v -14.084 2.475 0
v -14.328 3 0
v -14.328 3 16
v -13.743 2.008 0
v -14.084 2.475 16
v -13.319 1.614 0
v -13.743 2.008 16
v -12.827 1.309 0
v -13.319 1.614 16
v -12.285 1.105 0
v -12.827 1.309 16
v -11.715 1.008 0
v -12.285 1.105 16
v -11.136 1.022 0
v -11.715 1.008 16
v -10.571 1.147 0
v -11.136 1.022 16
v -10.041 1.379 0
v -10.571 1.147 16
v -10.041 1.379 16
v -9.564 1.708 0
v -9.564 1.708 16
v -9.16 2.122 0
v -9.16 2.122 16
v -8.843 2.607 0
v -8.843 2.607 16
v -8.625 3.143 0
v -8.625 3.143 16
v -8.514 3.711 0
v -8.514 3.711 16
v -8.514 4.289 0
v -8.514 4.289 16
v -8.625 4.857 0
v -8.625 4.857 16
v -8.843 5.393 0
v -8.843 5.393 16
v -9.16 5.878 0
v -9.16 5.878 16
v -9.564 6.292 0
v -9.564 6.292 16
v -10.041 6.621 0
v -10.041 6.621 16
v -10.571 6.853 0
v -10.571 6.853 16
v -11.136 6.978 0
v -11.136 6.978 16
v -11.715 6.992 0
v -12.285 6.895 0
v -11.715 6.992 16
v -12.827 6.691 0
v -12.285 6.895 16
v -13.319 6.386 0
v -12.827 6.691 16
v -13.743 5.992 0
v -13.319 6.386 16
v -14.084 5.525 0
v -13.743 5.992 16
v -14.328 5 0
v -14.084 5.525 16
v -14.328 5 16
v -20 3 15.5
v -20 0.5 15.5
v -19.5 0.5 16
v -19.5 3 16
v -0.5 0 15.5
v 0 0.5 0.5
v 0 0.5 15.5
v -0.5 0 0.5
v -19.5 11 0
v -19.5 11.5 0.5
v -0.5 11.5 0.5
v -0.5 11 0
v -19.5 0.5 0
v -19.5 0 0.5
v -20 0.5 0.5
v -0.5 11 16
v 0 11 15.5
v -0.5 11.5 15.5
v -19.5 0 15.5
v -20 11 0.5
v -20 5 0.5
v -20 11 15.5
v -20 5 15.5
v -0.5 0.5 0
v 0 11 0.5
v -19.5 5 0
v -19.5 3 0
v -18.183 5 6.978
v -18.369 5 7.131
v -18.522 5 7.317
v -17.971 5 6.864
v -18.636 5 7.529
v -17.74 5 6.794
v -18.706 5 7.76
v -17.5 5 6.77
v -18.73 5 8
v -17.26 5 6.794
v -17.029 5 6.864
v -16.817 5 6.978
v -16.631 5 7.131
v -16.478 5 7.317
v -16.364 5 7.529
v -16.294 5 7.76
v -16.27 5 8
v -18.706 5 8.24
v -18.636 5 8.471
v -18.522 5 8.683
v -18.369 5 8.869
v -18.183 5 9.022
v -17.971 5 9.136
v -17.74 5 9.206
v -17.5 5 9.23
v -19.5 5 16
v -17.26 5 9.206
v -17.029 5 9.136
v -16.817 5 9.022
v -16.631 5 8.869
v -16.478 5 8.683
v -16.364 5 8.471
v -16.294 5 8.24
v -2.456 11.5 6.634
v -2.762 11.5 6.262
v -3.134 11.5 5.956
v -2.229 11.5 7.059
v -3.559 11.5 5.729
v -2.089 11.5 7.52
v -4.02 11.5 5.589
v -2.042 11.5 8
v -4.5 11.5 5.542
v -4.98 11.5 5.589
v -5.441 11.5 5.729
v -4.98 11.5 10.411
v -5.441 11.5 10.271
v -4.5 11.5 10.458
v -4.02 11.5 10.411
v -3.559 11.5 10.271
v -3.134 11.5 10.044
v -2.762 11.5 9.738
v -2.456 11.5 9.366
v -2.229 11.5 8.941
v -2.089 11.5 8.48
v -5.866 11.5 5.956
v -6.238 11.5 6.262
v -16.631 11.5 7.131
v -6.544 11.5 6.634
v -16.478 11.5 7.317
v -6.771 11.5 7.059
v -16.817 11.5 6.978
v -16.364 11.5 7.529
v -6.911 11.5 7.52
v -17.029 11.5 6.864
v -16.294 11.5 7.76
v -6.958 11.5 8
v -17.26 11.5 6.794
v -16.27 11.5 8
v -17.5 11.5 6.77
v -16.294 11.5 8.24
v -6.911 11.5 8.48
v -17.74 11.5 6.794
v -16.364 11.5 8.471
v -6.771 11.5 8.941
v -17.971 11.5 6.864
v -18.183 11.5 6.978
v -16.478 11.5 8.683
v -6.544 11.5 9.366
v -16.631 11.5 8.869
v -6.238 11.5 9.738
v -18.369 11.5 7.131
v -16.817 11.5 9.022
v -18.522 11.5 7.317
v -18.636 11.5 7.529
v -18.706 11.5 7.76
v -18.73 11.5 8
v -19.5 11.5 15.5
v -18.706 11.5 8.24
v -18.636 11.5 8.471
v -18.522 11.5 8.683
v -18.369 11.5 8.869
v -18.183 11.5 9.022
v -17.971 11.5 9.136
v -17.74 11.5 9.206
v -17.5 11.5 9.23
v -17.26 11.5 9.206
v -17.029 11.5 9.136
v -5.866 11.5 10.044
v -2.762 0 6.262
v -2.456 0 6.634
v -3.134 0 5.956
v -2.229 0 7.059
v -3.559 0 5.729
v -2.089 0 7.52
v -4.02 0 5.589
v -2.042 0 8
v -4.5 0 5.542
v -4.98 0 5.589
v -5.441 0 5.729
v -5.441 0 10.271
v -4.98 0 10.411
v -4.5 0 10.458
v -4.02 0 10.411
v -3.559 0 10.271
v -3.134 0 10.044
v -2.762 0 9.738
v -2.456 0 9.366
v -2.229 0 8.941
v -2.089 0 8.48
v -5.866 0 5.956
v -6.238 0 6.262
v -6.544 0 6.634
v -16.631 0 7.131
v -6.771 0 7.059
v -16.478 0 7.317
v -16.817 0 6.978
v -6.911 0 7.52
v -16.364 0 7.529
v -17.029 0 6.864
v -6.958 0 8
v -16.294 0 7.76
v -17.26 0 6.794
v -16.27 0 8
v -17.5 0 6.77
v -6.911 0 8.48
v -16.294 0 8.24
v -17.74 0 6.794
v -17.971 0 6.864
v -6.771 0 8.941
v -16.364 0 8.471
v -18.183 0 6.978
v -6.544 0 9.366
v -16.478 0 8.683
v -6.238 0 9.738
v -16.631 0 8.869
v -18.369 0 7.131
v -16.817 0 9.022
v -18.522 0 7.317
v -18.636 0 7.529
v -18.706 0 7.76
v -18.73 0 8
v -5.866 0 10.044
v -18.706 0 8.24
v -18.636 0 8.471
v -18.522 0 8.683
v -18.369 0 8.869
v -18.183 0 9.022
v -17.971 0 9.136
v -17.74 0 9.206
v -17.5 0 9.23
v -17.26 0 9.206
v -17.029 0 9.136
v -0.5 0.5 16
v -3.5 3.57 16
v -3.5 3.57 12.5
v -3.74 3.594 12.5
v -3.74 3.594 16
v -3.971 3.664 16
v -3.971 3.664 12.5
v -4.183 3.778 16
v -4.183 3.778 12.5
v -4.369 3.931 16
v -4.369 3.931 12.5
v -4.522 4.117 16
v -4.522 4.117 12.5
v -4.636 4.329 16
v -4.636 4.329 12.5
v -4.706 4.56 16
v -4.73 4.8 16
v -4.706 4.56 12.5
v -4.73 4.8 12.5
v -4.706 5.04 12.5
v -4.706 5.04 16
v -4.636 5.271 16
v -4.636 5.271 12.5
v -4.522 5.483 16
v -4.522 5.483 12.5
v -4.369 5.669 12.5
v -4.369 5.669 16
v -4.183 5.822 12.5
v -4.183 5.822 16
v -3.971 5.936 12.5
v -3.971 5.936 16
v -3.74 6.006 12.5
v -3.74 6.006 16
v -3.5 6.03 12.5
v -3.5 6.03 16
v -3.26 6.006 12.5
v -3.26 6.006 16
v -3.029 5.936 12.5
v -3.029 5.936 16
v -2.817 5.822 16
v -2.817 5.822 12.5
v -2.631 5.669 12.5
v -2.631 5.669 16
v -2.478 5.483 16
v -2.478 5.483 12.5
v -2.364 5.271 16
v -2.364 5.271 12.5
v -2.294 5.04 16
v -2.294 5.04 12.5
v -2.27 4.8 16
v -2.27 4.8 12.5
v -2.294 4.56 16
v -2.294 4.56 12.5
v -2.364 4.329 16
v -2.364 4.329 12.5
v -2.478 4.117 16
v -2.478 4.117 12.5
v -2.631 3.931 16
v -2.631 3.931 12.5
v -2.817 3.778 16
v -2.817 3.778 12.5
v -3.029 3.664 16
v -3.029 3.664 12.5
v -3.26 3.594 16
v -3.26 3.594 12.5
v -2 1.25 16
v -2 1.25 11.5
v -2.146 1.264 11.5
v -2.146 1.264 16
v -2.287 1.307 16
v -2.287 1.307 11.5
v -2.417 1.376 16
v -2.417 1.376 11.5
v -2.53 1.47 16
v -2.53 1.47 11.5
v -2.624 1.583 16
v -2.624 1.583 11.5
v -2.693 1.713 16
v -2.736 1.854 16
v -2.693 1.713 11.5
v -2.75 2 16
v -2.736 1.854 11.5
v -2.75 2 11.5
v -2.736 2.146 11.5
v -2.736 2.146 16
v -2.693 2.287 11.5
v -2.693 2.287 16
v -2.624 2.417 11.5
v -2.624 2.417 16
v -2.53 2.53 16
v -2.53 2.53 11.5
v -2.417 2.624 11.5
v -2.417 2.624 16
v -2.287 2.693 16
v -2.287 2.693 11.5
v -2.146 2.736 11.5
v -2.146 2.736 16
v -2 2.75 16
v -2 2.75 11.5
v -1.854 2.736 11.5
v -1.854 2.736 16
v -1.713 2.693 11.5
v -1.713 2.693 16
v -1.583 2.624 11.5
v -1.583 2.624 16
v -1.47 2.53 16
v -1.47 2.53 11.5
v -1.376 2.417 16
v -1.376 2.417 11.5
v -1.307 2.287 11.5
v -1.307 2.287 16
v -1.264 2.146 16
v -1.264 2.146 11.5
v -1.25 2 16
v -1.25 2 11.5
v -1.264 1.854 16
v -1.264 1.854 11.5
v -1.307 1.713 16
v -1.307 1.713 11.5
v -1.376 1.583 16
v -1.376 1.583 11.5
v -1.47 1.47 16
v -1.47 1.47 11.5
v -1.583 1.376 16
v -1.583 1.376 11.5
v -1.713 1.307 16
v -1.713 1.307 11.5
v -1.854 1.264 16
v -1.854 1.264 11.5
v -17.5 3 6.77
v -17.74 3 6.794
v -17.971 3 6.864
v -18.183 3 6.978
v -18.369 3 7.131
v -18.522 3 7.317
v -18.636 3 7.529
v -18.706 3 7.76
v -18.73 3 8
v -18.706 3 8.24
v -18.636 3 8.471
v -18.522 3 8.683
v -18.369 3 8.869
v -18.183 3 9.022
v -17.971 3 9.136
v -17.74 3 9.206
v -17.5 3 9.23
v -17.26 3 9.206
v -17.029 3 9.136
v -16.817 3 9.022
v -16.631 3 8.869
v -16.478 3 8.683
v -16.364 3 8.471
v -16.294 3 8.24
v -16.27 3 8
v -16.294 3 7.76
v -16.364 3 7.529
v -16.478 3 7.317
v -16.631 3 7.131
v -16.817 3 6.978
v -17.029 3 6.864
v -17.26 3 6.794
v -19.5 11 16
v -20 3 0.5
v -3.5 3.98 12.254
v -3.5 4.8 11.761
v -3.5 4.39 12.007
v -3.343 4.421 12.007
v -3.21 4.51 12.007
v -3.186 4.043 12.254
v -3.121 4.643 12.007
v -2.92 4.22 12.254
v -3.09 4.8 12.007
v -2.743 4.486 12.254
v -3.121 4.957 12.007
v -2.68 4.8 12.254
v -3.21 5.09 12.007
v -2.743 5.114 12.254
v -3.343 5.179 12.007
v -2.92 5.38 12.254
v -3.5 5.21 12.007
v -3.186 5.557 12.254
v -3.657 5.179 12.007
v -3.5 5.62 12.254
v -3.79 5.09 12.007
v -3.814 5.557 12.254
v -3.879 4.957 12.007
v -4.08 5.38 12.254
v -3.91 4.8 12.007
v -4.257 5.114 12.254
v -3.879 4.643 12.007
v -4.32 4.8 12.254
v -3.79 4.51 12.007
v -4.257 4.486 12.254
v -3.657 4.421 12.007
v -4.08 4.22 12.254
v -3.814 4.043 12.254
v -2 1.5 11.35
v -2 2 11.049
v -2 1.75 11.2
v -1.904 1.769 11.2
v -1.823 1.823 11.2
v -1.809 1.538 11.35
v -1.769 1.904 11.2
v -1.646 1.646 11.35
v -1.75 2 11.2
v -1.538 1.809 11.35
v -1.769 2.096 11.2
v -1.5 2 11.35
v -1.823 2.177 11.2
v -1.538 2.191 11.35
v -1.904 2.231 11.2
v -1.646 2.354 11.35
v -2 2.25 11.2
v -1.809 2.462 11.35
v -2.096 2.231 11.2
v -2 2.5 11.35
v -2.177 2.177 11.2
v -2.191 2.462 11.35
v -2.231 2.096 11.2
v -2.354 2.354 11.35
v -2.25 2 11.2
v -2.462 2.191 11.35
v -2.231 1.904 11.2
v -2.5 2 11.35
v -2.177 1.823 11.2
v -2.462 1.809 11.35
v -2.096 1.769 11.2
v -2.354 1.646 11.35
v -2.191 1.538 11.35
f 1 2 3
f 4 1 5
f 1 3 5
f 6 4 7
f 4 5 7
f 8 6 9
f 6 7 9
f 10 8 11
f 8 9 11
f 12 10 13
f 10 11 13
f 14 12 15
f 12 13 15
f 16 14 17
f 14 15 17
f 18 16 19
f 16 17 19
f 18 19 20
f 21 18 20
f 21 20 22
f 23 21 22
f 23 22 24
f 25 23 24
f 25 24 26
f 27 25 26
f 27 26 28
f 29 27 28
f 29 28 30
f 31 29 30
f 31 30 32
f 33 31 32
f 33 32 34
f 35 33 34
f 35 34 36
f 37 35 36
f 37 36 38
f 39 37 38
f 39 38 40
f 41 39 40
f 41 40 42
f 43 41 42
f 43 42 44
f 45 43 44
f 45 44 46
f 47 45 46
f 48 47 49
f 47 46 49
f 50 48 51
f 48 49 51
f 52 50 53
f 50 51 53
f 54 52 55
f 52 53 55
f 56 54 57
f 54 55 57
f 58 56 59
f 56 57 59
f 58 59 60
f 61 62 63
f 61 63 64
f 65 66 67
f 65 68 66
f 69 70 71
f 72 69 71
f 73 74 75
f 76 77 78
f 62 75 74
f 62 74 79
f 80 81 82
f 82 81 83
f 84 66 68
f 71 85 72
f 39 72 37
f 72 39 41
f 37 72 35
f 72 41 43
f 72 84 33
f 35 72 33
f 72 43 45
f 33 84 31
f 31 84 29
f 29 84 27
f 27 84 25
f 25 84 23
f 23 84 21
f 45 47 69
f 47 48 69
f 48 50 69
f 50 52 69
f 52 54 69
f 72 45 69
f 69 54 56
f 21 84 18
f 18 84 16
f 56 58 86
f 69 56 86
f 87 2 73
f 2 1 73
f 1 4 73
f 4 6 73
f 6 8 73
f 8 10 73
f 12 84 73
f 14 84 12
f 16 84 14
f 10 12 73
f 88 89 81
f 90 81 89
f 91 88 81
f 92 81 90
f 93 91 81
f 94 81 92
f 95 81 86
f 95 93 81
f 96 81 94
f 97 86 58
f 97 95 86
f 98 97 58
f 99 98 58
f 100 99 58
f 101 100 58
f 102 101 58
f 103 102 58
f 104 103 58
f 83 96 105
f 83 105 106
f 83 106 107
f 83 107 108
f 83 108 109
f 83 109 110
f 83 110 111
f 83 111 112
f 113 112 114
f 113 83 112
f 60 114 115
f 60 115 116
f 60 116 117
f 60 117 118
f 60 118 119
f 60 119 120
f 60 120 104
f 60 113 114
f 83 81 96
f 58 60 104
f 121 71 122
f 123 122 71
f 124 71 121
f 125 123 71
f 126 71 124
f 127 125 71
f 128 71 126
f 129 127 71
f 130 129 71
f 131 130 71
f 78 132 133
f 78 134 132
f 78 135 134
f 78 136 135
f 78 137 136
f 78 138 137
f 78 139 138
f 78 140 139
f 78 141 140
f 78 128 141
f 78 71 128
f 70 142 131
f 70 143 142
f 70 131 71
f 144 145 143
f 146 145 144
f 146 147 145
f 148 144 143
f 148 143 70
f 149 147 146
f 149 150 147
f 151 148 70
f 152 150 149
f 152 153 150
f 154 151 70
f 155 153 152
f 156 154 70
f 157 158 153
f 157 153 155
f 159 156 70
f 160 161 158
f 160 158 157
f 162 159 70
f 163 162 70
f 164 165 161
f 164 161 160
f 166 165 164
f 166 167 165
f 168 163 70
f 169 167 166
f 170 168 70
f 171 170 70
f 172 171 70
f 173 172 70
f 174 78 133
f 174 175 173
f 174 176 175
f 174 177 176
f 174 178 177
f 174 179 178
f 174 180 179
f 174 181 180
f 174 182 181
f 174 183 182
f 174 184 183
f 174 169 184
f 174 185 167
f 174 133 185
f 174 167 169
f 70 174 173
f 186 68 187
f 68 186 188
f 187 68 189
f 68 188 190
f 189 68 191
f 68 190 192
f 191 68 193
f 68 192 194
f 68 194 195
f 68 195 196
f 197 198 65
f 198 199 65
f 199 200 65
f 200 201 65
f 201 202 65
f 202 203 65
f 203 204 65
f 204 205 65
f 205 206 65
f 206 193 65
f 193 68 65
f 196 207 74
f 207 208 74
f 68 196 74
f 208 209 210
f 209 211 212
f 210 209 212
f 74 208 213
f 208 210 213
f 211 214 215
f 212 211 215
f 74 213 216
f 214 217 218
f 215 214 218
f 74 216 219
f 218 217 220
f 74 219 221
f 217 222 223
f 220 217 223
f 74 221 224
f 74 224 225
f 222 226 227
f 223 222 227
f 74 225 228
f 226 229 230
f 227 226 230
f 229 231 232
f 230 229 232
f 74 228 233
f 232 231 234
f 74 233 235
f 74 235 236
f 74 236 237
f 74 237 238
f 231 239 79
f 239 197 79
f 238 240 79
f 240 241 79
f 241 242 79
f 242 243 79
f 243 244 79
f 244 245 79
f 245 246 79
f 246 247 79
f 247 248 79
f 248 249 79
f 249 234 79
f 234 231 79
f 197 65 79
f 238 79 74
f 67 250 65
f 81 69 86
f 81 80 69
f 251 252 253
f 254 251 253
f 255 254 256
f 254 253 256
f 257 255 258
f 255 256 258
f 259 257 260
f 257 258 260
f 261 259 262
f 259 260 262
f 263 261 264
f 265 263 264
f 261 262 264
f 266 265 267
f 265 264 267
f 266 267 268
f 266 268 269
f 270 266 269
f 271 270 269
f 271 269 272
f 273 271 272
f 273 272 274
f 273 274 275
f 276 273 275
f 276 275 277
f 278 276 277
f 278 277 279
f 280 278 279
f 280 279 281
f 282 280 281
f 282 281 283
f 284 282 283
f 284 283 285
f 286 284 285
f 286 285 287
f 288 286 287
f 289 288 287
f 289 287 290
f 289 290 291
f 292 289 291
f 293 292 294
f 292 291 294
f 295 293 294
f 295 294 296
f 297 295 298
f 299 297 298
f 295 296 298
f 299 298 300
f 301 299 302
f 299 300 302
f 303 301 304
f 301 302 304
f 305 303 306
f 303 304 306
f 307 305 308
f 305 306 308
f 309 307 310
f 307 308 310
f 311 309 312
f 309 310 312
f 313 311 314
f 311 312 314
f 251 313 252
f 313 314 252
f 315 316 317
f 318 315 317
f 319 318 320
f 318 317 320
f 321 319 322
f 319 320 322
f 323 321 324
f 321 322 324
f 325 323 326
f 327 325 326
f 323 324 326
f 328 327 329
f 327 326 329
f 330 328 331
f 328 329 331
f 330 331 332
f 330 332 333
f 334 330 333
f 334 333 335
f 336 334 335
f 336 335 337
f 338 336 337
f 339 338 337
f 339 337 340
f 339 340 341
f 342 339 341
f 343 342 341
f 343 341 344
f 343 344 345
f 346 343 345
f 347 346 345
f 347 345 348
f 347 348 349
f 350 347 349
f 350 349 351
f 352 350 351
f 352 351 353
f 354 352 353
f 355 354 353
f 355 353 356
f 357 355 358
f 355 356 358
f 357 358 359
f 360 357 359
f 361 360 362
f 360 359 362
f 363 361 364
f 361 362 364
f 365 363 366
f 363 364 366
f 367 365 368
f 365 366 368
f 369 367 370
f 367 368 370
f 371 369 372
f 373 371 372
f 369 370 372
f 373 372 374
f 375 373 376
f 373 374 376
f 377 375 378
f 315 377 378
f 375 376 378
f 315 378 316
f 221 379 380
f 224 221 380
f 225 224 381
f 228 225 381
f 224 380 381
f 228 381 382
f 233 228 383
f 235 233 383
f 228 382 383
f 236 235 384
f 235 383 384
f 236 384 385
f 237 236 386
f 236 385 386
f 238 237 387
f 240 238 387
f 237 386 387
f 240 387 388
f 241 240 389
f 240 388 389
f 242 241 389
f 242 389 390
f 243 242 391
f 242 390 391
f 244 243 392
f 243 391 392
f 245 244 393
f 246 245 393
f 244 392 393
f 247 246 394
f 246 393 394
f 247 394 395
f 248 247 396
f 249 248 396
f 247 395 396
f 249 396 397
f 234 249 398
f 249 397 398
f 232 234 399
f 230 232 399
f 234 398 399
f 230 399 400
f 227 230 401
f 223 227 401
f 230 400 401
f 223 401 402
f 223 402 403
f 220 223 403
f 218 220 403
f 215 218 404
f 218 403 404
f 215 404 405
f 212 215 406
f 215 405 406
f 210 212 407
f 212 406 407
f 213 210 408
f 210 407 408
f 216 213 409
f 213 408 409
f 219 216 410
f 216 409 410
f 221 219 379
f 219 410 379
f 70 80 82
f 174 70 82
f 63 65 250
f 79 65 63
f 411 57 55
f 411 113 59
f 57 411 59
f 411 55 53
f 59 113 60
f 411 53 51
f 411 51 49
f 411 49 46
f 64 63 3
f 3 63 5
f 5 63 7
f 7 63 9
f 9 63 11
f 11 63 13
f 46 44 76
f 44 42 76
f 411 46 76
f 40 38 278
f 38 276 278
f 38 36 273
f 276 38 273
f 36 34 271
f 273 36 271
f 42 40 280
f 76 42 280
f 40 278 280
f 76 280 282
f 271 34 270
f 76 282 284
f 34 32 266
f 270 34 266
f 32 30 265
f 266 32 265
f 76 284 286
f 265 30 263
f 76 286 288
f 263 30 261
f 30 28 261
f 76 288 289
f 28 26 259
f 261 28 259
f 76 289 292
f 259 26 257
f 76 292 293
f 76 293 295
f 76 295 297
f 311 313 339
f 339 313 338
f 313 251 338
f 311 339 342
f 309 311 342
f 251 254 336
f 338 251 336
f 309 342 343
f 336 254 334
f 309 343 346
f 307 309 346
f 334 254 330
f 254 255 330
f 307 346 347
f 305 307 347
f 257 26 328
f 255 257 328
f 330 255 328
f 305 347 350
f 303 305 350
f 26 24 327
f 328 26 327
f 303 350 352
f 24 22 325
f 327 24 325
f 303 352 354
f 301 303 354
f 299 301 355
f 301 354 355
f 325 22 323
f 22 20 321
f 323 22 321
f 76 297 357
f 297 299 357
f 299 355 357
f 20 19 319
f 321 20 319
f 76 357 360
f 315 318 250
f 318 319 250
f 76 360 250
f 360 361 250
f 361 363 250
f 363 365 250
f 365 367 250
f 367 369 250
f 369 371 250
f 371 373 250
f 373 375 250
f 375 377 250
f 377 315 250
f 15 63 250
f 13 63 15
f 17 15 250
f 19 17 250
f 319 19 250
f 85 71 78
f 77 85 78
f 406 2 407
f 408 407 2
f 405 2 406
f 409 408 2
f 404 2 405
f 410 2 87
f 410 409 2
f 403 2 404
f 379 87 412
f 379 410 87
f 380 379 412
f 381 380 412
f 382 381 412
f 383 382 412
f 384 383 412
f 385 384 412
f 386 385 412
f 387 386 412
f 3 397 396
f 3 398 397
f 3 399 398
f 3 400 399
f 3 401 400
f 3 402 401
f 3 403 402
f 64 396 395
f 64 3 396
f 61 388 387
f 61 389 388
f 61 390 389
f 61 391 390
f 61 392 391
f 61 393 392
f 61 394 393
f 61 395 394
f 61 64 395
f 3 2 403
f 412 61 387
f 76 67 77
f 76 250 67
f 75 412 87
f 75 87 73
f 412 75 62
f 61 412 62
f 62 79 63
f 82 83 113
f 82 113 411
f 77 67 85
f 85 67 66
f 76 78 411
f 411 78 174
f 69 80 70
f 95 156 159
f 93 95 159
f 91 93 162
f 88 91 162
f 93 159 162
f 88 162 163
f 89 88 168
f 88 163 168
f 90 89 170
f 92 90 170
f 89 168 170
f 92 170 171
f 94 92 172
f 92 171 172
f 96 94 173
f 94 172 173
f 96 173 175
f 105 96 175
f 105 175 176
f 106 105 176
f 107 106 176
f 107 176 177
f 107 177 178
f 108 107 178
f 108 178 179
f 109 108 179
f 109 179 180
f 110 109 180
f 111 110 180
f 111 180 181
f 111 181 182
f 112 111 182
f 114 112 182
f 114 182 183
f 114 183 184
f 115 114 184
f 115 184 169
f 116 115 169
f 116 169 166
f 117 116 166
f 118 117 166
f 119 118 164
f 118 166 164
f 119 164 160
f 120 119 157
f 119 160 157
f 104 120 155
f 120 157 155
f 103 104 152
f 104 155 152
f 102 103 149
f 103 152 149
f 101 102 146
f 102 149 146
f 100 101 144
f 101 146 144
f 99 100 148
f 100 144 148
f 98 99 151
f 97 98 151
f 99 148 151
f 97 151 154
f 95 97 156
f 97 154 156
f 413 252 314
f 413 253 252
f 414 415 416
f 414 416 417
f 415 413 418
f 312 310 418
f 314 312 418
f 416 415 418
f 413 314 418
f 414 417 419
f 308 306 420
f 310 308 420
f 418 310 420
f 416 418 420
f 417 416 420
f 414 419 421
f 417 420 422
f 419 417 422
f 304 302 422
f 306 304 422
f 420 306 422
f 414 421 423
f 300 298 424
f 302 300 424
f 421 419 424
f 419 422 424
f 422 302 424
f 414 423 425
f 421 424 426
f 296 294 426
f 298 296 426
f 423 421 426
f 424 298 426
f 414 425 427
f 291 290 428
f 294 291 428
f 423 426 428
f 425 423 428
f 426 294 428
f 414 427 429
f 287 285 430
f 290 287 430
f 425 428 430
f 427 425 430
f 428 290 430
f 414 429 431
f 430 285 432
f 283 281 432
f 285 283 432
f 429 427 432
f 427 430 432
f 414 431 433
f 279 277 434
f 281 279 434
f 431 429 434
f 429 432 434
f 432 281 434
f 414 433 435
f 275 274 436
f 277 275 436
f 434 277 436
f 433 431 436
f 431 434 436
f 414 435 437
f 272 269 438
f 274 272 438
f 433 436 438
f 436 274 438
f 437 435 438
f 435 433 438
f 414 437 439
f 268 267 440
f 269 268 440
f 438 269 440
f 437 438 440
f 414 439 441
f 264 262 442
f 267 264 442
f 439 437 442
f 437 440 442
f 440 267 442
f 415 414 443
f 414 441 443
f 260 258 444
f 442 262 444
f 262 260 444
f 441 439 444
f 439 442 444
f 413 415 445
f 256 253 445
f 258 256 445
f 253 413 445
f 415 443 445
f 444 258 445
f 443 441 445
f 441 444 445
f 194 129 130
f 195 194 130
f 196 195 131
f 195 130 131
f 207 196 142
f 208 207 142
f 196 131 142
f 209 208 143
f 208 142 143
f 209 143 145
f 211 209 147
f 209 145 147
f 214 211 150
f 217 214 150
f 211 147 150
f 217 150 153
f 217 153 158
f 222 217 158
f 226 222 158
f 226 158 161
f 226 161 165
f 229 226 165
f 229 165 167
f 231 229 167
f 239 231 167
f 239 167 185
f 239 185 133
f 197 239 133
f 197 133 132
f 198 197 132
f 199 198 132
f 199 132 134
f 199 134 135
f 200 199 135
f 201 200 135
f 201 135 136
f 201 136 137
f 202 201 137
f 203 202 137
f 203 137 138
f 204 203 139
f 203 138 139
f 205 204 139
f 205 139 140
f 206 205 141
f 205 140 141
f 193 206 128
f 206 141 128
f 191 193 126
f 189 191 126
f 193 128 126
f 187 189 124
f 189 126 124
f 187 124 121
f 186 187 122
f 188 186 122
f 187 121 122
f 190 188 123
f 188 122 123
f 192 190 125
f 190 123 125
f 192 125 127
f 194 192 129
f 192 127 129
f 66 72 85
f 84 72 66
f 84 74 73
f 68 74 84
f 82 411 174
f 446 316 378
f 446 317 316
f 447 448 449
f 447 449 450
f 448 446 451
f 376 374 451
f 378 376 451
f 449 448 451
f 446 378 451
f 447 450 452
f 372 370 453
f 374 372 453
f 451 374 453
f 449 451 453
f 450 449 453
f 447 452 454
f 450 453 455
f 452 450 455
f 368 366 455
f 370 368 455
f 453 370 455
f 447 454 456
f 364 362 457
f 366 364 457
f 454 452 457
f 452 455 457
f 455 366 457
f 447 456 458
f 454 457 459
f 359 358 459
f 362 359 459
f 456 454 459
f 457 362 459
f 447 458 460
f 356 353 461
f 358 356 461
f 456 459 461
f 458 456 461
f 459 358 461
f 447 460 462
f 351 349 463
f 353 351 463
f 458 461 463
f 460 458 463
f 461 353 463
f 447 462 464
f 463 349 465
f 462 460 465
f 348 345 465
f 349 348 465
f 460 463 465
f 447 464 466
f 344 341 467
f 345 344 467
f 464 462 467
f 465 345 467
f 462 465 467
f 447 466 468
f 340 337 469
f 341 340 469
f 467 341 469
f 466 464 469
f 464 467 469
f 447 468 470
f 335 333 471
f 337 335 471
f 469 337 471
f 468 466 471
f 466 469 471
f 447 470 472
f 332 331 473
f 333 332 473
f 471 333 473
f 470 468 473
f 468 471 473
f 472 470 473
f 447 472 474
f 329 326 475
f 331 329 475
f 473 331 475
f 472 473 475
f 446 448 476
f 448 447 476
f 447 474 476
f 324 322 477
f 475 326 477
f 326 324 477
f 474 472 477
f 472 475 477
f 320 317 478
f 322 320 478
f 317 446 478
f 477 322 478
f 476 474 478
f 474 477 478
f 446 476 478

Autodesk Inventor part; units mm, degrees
ref_plane "YZ Plane" through (0, 0, 0) normal (1, 0, 0) x (0, 1, 0)
ref_plane "XZ Plane" through (0, 0, 0) normal (0, 1, 0) x (-1, 0, 0)
ref_plane "XY Plane" through (0, 0, 0) normal (0, 0, 1) x (1, 0, 0)
sketch "草圖1" plane through (0, 0, 0) normal (0, 1, 0) x (-1, 0, 0)
  line L0 (0, 0) -> (20, 0)
  line L1 (20, 0) -> (20, 16)
  line L2 (20, 16) -> (0, 16)
  line L3 (0, 16) -> (0, 0)
  dimension "d0" = 20
  dimension "d1" = 16
extrude "擠出1" add sketch "草圖1" along normal blind 11.5
sketch "草圖2" plane through (-20, 0, 16) normal (0, 0, 1) x (1, 0, 0)
  line L0 (0, 0) -> (20, 0) projected
  line L1 (20, 0) -> (20, 11.5) projected
  point P0 (16.5, 4.8)
  dimension "d4" = 3.5
  dimension "d5" = 4.8
hole "孔1" at (-3.5, 4.8, 16) direction (0, 0, -1) diameter 2.459 depth 3.5 tip angle 118 thread size "M3x0.5" class "6H" standard "ANSI Metric M Profile"
sketch "草圖3" plane through (-20, 0, 16) normal (0, 0, 1) x (1, 0, 0)
  line L0 (0, 0) -> (20, 0) projected
  line L1 (20, 0) -> (20, 11.5) projected
  point P0 (18, 2)
  dimension "d13" = 2
  dimension "d14" = 2
hole "孔2" at (-2, 2, 16) direction (0, 0, -1) diameter 1.5 depth 4.5 tip angle 118
chamfer "倒角1" distance 0.5 angle 45 12 edges at (-10, 0, 16) (0, 5.75, 16) (0, 0, 8) (-20, 0, 8) (-20, 5.75, 16) (0, 5.75, 0) (-10, 0, 0) (0, 11.5, 8) (-10, 11.5, 16) (-20, 11.5, 8) (-20, 5.75, 0) (-10, 11.5, 0)
sketch "草圖4" plane through (-19.5, 0.5, 16) normal (0, 0, 1) x (1, 0, 0)
  circle A0 centre (8, 3.5) radius 3
  line L0 (0, -0.5) -> (19, -0.5) projected
  line L1 (-0.5, 4.5) -> (8, 4.5)
  line L2 (8, 4.5) -> (8, 2.5)
  line L3 (8, 2.5) -> (-0.5, 2.5)
  line L4 (-0.5, 2.5) -> (-0.5, 4.5)
  point P0 (19.5, -0.5)
  dimension "d25" = 6
  dimension "d27" = 11.5
  dimension "d28" = 4
  dimension "d29" = 2
  dimension "d30" = 8.5
extrude "擠出2" cut sketch "草圖4" against normal through all
sketch "草圖5" plane through (0, 0, 0) normal (0, -1, 0) x (1, 0, 0)
  point P0 (0, 0)
  point P1 (-17.5, 8)
  dimension "d35" = 17.5
hole "孔3" at (-17.5, 0, 8) direction (0, 1, 0) diameter 2.459 end through all thread size "M3x0.5" class "6H" standard "ANSI Metric M Profile"
sketch "草圖6" plane through (0, 0, 0) normal (0, -1, 0) x (1, 0, 0)
  point P0 (0, 0)
  point P1 (-4.5, 8)
  dimension "d43" = 4.5
hole "孔4" at (-4.5, 0, 8) direction (0, 1, 0) diameter 4.917 end through all thread size "M6x1" class "6H" standard "ANSI Metric M Profile"
properties part number "e3d_v6_heat_block"
